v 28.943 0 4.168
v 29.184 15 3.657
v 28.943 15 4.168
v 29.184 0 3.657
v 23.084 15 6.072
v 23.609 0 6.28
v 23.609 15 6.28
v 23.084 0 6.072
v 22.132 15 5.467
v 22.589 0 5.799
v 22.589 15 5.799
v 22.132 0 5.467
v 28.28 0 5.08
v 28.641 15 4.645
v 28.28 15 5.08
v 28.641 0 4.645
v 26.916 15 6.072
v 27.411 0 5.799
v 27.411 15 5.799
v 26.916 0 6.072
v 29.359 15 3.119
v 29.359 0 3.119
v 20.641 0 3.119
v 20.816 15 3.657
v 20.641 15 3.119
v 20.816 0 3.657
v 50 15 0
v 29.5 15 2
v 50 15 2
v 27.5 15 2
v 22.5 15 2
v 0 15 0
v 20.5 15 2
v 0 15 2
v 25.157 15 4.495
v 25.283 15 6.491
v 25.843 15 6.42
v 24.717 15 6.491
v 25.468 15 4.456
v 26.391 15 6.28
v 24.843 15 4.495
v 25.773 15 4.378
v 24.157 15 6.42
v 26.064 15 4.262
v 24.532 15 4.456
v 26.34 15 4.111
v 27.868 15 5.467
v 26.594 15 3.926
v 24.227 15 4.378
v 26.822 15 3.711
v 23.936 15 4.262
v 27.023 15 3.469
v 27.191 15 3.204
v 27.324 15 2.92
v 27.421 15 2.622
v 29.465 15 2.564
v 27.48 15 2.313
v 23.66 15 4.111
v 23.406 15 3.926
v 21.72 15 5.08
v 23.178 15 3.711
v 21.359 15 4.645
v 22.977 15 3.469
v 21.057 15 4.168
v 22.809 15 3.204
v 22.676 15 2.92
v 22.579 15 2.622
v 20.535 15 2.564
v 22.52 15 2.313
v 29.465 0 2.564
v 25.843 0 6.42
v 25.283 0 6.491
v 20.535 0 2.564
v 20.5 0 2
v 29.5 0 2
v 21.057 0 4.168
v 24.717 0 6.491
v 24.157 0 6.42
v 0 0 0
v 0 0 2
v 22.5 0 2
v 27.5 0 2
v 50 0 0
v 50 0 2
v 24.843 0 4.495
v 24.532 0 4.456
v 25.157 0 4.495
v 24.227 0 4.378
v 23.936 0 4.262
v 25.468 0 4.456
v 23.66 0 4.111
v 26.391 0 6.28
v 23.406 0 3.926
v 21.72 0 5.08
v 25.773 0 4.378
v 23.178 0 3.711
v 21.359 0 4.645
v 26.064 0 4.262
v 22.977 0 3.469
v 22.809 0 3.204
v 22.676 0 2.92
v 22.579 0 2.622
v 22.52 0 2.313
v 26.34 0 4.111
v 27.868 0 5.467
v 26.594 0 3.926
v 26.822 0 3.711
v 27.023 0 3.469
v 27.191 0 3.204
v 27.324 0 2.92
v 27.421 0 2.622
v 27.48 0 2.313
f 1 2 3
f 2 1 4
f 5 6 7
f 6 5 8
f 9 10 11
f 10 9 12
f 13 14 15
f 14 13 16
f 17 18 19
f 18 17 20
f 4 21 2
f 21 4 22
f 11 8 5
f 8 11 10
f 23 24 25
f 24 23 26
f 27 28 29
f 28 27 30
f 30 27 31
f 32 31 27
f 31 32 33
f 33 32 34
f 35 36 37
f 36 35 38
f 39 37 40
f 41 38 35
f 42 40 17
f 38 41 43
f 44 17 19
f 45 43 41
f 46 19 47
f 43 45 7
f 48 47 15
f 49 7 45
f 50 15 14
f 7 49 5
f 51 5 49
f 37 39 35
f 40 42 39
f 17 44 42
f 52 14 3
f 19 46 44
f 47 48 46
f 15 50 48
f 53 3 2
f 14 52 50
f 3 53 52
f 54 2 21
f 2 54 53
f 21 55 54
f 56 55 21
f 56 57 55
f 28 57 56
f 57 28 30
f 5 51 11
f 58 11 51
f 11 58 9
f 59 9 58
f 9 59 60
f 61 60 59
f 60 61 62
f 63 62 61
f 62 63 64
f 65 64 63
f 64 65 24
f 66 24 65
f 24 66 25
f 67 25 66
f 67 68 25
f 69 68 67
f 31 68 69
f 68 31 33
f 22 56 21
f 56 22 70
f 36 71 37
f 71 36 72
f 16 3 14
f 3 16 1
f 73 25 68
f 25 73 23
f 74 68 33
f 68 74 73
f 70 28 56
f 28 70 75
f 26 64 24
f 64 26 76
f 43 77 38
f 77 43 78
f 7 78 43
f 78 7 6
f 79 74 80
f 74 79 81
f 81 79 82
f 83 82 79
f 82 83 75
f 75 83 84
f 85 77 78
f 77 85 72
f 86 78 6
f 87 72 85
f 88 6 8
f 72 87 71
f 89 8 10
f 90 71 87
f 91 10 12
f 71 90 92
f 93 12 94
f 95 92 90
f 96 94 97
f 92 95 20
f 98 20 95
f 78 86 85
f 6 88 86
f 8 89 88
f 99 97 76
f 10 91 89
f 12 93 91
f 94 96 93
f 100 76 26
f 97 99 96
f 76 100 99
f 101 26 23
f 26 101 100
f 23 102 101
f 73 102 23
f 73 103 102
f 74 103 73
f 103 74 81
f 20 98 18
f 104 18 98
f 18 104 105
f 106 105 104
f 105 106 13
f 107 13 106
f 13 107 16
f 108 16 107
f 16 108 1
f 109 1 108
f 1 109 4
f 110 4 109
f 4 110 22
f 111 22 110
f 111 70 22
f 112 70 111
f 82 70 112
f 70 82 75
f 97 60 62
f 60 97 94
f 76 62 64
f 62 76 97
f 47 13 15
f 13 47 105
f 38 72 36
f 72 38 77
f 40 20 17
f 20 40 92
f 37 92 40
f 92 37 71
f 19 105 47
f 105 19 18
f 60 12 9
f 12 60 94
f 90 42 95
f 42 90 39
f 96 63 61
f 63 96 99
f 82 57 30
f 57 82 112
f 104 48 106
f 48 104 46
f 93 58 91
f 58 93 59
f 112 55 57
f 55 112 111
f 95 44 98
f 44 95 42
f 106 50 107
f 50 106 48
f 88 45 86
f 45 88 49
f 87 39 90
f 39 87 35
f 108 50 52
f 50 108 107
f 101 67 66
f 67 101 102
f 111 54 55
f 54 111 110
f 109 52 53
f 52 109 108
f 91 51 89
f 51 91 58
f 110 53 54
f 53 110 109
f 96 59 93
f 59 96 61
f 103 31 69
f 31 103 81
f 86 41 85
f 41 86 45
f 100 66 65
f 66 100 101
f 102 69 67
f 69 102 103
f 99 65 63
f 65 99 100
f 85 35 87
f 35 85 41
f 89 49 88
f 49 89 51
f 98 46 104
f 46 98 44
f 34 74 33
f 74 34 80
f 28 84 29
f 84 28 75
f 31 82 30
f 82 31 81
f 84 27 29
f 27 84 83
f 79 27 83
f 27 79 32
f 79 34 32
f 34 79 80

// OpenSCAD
$fn = 50;

/* Ceiling Loop Mount */

/* [Enable/Disable Loops] */
loop_pos = "c"; // [c:center,l:left,r:right, a:all, s:side only]

/* [Mounting Strip Base]  */
/* Command Strip dimentions is typically 50mmx15mm */
sx = 50 ; // length of mounting strip base
sy = 15 ; // widith of mounting strip base
sh = 2  ; // height of mounting strip base

/* [Loop Sizing] */
lt = 2; // loop thickness
lh = 5; // loop holesize

/* Hook function and module */
function loop_width(thickness, holesize) = holesize+thickness*2;
module hook(x, z, thickness, holesize)
{
    /* Hook centre */
    translate([x, 0  , z])
    difference()
    {
        outerdia = (holesize+thickness*2);
        rotate([-90,0,0])
            cylinder(r=outerdia/2, h=sy);
        #translate([0, -1  , 0])
            rotate([-90,,0])
            cylinder(r=holesize/2, h=sy+1);
        #translate([-outerdia/2  , -1/2  , -outerdia/2])
            cube([outerdia,sy+1,outerdia/2]);
    }
}

union() {
    translate([0  , 0  , 0])
        cube([sx,sy,sh]);
    
    if ((loop_pos == "a")||(loop_pos == "c"))
        hook(sx/2, sh, lt, lh);
    if ((loop_pos == "a")||(loop_pos == "s")||(loop_pos == "l"))
        hook(loop_width(lt, lh)/2, sh, lt, lh);
    if ((loop_pos == "a")||(loop_pos == "s")||(loop_pos == "r") )
        hook(sx-loop_width(lt, lh)/2, sh, lt, lh);
} 
